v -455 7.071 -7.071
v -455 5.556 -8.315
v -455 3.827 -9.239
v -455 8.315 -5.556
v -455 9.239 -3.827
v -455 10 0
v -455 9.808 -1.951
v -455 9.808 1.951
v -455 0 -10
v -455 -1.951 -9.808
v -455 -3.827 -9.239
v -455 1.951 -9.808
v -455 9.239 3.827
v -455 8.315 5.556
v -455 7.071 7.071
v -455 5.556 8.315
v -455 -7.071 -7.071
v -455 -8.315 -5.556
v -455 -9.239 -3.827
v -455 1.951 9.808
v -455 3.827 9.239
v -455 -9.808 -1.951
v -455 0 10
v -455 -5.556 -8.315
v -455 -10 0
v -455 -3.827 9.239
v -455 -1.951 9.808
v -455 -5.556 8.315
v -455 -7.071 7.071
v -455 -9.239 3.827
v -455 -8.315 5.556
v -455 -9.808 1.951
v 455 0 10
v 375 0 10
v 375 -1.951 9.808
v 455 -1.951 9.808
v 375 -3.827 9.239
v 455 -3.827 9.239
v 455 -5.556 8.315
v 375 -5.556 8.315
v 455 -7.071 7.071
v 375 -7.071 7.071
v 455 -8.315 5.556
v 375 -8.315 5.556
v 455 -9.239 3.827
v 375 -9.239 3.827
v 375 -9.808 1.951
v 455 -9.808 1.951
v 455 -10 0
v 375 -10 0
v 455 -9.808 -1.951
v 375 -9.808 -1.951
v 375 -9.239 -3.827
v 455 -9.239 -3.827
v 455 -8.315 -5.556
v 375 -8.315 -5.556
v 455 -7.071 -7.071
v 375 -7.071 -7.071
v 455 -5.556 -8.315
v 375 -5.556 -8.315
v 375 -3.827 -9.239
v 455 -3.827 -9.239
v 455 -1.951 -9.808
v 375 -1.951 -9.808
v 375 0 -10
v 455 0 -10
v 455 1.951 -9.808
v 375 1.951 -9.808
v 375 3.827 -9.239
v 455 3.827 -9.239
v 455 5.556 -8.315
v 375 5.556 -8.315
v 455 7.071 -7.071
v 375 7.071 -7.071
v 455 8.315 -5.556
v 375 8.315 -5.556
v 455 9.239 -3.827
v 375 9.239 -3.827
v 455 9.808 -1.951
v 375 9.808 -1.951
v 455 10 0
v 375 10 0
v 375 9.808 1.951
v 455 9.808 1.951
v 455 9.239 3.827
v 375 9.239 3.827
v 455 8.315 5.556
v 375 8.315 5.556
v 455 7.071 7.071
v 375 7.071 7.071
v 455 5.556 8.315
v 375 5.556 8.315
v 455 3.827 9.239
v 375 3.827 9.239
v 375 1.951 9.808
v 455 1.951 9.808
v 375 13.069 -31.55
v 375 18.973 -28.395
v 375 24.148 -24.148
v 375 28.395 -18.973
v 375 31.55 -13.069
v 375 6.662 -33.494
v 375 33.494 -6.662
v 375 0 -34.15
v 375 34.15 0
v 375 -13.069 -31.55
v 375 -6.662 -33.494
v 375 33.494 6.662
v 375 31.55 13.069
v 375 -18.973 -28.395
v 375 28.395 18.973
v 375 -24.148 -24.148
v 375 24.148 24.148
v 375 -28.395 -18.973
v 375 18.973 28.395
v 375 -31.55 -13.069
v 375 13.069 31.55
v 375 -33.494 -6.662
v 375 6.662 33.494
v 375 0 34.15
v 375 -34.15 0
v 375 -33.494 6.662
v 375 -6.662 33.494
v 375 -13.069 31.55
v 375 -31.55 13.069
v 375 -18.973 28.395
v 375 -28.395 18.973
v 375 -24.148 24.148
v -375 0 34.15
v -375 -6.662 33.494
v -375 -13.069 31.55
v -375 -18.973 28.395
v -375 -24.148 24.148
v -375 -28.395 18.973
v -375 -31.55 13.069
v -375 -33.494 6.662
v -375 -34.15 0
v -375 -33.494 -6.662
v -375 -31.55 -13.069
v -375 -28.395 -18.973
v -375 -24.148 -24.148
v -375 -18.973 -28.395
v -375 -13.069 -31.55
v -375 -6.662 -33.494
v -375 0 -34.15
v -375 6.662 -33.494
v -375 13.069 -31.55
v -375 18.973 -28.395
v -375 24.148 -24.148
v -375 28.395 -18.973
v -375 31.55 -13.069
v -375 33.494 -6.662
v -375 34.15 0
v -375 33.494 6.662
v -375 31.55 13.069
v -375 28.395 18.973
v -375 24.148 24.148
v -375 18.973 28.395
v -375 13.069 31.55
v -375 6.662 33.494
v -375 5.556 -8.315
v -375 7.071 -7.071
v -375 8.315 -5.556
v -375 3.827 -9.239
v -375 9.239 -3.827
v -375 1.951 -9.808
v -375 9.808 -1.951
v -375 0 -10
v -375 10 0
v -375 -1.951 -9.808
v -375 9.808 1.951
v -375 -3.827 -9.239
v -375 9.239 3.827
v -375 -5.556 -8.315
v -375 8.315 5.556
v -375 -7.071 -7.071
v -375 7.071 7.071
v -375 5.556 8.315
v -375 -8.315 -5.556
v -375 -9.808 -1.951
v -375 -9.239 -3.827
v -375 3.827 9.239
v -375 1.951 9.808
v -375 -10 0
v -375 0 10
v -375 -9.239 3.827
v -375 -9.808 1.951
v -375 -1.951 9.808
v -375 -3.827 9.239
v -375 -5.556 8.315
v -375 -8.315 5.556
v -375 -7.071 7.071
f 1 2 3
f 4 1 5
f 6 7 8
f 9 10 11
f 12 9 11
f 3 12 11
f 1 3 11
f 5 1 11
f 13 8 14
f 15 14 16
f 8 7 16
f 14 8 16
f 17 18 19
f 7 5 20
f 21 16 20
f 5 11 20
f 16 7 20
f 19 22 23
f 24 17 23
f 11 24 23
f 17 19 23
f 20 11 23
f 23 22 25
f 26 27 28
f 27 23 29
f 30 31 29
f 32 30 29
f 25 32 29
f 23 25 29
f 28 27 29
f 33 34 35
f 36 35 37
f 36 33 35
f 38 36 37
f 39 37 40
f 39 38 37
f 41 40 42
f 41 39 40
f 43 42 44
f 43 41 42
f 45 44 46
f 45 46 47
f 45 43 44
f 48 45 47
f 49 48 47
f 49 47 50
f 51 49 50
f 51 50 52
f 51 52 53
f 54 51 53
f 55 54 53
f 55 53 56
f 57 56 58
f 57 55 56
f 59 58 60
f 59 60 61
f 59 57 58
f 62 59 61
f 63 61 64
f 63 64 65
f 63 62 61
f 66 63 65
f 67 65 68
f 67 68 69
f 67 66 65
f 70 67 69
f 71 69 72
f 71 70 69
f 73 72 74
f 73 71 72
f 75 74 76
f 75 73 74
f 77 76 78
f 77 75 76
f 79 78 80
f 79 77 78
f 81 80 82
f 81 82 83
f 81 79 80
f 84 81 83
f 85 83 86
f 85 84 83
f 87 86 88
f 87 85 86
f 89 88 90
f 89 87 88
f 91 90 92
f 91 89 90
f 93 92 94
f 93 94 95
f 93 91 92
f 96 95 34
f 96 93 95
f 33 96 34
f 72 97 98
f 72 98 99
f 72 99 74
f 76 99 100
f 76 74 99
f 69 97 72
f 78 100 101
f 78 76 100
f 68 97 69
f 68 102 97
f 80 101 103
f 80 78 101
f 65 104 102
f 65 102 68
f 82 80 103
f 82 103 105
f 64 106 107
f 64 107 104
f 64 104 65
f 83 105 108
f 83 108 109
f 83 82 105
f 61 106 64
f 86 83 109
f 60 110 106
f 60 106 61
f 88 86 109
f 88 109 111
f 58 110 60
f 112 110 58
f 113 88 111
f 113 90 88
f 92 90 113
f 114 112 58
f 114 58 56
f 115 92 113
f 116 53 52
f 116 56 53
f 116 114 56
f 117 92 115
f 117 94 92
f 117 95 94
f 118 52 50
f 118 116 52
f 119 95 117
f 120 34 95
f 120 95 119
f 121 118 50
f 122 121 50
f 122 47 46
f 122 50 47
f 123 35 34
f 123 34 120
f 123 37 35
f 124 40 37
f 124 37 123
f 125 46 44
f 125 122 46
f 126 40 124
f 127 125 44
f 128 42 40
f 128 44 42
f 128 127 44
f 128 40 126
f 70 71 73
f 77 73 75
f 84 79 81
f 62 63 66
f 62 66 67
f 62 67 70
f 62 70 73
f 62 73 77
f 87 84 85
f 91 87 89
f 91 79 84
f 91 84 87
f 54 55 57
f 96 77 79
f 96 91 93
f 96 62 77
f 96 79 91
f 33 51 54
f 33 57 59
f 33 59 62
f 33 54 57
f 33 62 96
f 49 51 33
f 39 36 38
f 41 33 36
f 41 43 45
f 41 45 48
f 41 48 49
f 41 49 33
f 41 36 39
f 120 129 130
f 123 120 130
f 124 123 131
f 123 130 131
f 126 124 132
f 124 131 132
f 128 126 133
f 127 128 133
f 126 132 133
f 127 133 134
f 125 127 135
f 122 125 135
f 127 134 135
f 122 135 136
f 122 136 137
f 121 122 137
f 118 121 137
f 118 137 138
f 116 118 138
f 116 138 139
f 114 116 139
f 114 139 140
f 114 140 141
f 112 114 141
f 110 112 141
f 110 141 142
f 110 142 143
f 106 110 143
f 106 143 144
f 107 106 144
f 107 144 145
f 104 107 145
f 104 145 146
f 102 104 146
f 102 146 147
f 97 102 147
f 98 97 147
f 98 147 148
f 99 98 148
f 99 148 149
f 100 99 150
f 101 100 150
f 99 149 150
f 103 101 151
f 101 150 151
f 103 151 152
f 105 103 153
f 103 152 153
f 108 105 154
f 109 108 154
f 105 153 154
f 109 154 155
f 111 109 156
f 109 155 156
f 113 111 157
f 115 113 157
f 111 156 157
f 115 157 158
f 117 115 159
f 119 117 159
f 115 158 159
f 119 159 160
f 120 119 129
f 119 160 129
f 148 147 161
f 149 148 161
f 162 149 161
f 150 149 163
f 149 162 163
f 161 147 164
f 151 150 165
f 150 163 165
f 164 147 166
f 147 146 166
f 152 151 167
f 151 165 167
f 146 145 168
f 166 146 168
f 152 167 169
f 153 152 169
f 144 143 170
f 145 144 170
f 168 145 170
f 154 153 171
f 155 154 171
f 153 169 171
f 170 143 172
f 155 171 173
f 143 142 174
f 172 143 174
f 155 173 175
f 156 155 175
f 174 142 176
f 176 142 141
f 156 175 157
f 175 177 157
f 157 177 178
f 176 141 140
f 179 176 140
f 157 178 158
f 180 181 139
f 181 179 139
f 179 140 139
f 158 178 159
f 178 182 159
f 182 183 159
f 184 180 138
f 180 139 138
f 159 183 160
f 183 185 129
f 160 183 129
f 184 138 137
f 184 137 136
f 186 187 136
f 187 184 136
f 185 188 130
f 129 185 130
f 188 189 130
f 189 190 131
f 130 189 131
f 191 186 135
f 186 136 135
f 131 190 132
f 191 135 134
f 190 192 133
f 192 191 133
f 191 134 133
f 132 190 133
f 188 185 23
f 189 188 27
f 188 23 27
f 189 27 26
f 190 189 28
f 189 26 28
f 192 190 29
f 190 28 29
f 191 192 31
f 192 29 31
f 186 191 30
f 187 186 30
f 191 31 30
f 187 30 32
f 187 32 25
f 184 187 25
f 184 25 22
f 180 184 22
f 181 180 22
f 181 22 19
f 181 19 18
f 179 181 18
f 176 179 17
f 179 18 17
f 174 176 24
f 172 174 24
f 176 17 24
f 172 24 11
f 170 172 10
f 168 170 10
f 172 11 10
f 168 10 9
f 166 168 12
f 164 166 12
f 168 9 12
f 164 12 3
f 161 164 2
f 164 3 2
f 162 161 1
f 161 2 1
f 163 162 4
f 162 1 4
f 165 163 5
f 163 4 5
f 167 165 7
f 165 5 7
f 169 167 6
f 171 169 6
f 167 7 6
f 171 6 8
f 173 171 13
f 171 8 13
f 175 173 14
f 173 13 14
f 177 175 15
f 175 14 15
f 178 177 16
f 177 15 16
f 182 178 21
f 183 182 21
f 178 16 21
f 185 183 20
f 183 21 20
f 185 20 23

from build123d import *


with BuildPart() as part:
    # roll_75_sketch → Revolution (revolve)
    with BuildSketch(Plane.XZ):
        Polygon((0, 34.15), (375, 34.15), (375, 10), (455, 10), (455, 0), (0, 0), align=None)
    revolution = revolve(axis=Axis((0, 0, 0), (1, 0, 0)))

    # Mirrored: Revolution across roll_75_sketch V_Axis
    add(revolution.mirror(Plane(origin=(0, 0, 0), x_dir=(0, -1, 0), z_dir=(1, 0, 0))))


solid = part.part
